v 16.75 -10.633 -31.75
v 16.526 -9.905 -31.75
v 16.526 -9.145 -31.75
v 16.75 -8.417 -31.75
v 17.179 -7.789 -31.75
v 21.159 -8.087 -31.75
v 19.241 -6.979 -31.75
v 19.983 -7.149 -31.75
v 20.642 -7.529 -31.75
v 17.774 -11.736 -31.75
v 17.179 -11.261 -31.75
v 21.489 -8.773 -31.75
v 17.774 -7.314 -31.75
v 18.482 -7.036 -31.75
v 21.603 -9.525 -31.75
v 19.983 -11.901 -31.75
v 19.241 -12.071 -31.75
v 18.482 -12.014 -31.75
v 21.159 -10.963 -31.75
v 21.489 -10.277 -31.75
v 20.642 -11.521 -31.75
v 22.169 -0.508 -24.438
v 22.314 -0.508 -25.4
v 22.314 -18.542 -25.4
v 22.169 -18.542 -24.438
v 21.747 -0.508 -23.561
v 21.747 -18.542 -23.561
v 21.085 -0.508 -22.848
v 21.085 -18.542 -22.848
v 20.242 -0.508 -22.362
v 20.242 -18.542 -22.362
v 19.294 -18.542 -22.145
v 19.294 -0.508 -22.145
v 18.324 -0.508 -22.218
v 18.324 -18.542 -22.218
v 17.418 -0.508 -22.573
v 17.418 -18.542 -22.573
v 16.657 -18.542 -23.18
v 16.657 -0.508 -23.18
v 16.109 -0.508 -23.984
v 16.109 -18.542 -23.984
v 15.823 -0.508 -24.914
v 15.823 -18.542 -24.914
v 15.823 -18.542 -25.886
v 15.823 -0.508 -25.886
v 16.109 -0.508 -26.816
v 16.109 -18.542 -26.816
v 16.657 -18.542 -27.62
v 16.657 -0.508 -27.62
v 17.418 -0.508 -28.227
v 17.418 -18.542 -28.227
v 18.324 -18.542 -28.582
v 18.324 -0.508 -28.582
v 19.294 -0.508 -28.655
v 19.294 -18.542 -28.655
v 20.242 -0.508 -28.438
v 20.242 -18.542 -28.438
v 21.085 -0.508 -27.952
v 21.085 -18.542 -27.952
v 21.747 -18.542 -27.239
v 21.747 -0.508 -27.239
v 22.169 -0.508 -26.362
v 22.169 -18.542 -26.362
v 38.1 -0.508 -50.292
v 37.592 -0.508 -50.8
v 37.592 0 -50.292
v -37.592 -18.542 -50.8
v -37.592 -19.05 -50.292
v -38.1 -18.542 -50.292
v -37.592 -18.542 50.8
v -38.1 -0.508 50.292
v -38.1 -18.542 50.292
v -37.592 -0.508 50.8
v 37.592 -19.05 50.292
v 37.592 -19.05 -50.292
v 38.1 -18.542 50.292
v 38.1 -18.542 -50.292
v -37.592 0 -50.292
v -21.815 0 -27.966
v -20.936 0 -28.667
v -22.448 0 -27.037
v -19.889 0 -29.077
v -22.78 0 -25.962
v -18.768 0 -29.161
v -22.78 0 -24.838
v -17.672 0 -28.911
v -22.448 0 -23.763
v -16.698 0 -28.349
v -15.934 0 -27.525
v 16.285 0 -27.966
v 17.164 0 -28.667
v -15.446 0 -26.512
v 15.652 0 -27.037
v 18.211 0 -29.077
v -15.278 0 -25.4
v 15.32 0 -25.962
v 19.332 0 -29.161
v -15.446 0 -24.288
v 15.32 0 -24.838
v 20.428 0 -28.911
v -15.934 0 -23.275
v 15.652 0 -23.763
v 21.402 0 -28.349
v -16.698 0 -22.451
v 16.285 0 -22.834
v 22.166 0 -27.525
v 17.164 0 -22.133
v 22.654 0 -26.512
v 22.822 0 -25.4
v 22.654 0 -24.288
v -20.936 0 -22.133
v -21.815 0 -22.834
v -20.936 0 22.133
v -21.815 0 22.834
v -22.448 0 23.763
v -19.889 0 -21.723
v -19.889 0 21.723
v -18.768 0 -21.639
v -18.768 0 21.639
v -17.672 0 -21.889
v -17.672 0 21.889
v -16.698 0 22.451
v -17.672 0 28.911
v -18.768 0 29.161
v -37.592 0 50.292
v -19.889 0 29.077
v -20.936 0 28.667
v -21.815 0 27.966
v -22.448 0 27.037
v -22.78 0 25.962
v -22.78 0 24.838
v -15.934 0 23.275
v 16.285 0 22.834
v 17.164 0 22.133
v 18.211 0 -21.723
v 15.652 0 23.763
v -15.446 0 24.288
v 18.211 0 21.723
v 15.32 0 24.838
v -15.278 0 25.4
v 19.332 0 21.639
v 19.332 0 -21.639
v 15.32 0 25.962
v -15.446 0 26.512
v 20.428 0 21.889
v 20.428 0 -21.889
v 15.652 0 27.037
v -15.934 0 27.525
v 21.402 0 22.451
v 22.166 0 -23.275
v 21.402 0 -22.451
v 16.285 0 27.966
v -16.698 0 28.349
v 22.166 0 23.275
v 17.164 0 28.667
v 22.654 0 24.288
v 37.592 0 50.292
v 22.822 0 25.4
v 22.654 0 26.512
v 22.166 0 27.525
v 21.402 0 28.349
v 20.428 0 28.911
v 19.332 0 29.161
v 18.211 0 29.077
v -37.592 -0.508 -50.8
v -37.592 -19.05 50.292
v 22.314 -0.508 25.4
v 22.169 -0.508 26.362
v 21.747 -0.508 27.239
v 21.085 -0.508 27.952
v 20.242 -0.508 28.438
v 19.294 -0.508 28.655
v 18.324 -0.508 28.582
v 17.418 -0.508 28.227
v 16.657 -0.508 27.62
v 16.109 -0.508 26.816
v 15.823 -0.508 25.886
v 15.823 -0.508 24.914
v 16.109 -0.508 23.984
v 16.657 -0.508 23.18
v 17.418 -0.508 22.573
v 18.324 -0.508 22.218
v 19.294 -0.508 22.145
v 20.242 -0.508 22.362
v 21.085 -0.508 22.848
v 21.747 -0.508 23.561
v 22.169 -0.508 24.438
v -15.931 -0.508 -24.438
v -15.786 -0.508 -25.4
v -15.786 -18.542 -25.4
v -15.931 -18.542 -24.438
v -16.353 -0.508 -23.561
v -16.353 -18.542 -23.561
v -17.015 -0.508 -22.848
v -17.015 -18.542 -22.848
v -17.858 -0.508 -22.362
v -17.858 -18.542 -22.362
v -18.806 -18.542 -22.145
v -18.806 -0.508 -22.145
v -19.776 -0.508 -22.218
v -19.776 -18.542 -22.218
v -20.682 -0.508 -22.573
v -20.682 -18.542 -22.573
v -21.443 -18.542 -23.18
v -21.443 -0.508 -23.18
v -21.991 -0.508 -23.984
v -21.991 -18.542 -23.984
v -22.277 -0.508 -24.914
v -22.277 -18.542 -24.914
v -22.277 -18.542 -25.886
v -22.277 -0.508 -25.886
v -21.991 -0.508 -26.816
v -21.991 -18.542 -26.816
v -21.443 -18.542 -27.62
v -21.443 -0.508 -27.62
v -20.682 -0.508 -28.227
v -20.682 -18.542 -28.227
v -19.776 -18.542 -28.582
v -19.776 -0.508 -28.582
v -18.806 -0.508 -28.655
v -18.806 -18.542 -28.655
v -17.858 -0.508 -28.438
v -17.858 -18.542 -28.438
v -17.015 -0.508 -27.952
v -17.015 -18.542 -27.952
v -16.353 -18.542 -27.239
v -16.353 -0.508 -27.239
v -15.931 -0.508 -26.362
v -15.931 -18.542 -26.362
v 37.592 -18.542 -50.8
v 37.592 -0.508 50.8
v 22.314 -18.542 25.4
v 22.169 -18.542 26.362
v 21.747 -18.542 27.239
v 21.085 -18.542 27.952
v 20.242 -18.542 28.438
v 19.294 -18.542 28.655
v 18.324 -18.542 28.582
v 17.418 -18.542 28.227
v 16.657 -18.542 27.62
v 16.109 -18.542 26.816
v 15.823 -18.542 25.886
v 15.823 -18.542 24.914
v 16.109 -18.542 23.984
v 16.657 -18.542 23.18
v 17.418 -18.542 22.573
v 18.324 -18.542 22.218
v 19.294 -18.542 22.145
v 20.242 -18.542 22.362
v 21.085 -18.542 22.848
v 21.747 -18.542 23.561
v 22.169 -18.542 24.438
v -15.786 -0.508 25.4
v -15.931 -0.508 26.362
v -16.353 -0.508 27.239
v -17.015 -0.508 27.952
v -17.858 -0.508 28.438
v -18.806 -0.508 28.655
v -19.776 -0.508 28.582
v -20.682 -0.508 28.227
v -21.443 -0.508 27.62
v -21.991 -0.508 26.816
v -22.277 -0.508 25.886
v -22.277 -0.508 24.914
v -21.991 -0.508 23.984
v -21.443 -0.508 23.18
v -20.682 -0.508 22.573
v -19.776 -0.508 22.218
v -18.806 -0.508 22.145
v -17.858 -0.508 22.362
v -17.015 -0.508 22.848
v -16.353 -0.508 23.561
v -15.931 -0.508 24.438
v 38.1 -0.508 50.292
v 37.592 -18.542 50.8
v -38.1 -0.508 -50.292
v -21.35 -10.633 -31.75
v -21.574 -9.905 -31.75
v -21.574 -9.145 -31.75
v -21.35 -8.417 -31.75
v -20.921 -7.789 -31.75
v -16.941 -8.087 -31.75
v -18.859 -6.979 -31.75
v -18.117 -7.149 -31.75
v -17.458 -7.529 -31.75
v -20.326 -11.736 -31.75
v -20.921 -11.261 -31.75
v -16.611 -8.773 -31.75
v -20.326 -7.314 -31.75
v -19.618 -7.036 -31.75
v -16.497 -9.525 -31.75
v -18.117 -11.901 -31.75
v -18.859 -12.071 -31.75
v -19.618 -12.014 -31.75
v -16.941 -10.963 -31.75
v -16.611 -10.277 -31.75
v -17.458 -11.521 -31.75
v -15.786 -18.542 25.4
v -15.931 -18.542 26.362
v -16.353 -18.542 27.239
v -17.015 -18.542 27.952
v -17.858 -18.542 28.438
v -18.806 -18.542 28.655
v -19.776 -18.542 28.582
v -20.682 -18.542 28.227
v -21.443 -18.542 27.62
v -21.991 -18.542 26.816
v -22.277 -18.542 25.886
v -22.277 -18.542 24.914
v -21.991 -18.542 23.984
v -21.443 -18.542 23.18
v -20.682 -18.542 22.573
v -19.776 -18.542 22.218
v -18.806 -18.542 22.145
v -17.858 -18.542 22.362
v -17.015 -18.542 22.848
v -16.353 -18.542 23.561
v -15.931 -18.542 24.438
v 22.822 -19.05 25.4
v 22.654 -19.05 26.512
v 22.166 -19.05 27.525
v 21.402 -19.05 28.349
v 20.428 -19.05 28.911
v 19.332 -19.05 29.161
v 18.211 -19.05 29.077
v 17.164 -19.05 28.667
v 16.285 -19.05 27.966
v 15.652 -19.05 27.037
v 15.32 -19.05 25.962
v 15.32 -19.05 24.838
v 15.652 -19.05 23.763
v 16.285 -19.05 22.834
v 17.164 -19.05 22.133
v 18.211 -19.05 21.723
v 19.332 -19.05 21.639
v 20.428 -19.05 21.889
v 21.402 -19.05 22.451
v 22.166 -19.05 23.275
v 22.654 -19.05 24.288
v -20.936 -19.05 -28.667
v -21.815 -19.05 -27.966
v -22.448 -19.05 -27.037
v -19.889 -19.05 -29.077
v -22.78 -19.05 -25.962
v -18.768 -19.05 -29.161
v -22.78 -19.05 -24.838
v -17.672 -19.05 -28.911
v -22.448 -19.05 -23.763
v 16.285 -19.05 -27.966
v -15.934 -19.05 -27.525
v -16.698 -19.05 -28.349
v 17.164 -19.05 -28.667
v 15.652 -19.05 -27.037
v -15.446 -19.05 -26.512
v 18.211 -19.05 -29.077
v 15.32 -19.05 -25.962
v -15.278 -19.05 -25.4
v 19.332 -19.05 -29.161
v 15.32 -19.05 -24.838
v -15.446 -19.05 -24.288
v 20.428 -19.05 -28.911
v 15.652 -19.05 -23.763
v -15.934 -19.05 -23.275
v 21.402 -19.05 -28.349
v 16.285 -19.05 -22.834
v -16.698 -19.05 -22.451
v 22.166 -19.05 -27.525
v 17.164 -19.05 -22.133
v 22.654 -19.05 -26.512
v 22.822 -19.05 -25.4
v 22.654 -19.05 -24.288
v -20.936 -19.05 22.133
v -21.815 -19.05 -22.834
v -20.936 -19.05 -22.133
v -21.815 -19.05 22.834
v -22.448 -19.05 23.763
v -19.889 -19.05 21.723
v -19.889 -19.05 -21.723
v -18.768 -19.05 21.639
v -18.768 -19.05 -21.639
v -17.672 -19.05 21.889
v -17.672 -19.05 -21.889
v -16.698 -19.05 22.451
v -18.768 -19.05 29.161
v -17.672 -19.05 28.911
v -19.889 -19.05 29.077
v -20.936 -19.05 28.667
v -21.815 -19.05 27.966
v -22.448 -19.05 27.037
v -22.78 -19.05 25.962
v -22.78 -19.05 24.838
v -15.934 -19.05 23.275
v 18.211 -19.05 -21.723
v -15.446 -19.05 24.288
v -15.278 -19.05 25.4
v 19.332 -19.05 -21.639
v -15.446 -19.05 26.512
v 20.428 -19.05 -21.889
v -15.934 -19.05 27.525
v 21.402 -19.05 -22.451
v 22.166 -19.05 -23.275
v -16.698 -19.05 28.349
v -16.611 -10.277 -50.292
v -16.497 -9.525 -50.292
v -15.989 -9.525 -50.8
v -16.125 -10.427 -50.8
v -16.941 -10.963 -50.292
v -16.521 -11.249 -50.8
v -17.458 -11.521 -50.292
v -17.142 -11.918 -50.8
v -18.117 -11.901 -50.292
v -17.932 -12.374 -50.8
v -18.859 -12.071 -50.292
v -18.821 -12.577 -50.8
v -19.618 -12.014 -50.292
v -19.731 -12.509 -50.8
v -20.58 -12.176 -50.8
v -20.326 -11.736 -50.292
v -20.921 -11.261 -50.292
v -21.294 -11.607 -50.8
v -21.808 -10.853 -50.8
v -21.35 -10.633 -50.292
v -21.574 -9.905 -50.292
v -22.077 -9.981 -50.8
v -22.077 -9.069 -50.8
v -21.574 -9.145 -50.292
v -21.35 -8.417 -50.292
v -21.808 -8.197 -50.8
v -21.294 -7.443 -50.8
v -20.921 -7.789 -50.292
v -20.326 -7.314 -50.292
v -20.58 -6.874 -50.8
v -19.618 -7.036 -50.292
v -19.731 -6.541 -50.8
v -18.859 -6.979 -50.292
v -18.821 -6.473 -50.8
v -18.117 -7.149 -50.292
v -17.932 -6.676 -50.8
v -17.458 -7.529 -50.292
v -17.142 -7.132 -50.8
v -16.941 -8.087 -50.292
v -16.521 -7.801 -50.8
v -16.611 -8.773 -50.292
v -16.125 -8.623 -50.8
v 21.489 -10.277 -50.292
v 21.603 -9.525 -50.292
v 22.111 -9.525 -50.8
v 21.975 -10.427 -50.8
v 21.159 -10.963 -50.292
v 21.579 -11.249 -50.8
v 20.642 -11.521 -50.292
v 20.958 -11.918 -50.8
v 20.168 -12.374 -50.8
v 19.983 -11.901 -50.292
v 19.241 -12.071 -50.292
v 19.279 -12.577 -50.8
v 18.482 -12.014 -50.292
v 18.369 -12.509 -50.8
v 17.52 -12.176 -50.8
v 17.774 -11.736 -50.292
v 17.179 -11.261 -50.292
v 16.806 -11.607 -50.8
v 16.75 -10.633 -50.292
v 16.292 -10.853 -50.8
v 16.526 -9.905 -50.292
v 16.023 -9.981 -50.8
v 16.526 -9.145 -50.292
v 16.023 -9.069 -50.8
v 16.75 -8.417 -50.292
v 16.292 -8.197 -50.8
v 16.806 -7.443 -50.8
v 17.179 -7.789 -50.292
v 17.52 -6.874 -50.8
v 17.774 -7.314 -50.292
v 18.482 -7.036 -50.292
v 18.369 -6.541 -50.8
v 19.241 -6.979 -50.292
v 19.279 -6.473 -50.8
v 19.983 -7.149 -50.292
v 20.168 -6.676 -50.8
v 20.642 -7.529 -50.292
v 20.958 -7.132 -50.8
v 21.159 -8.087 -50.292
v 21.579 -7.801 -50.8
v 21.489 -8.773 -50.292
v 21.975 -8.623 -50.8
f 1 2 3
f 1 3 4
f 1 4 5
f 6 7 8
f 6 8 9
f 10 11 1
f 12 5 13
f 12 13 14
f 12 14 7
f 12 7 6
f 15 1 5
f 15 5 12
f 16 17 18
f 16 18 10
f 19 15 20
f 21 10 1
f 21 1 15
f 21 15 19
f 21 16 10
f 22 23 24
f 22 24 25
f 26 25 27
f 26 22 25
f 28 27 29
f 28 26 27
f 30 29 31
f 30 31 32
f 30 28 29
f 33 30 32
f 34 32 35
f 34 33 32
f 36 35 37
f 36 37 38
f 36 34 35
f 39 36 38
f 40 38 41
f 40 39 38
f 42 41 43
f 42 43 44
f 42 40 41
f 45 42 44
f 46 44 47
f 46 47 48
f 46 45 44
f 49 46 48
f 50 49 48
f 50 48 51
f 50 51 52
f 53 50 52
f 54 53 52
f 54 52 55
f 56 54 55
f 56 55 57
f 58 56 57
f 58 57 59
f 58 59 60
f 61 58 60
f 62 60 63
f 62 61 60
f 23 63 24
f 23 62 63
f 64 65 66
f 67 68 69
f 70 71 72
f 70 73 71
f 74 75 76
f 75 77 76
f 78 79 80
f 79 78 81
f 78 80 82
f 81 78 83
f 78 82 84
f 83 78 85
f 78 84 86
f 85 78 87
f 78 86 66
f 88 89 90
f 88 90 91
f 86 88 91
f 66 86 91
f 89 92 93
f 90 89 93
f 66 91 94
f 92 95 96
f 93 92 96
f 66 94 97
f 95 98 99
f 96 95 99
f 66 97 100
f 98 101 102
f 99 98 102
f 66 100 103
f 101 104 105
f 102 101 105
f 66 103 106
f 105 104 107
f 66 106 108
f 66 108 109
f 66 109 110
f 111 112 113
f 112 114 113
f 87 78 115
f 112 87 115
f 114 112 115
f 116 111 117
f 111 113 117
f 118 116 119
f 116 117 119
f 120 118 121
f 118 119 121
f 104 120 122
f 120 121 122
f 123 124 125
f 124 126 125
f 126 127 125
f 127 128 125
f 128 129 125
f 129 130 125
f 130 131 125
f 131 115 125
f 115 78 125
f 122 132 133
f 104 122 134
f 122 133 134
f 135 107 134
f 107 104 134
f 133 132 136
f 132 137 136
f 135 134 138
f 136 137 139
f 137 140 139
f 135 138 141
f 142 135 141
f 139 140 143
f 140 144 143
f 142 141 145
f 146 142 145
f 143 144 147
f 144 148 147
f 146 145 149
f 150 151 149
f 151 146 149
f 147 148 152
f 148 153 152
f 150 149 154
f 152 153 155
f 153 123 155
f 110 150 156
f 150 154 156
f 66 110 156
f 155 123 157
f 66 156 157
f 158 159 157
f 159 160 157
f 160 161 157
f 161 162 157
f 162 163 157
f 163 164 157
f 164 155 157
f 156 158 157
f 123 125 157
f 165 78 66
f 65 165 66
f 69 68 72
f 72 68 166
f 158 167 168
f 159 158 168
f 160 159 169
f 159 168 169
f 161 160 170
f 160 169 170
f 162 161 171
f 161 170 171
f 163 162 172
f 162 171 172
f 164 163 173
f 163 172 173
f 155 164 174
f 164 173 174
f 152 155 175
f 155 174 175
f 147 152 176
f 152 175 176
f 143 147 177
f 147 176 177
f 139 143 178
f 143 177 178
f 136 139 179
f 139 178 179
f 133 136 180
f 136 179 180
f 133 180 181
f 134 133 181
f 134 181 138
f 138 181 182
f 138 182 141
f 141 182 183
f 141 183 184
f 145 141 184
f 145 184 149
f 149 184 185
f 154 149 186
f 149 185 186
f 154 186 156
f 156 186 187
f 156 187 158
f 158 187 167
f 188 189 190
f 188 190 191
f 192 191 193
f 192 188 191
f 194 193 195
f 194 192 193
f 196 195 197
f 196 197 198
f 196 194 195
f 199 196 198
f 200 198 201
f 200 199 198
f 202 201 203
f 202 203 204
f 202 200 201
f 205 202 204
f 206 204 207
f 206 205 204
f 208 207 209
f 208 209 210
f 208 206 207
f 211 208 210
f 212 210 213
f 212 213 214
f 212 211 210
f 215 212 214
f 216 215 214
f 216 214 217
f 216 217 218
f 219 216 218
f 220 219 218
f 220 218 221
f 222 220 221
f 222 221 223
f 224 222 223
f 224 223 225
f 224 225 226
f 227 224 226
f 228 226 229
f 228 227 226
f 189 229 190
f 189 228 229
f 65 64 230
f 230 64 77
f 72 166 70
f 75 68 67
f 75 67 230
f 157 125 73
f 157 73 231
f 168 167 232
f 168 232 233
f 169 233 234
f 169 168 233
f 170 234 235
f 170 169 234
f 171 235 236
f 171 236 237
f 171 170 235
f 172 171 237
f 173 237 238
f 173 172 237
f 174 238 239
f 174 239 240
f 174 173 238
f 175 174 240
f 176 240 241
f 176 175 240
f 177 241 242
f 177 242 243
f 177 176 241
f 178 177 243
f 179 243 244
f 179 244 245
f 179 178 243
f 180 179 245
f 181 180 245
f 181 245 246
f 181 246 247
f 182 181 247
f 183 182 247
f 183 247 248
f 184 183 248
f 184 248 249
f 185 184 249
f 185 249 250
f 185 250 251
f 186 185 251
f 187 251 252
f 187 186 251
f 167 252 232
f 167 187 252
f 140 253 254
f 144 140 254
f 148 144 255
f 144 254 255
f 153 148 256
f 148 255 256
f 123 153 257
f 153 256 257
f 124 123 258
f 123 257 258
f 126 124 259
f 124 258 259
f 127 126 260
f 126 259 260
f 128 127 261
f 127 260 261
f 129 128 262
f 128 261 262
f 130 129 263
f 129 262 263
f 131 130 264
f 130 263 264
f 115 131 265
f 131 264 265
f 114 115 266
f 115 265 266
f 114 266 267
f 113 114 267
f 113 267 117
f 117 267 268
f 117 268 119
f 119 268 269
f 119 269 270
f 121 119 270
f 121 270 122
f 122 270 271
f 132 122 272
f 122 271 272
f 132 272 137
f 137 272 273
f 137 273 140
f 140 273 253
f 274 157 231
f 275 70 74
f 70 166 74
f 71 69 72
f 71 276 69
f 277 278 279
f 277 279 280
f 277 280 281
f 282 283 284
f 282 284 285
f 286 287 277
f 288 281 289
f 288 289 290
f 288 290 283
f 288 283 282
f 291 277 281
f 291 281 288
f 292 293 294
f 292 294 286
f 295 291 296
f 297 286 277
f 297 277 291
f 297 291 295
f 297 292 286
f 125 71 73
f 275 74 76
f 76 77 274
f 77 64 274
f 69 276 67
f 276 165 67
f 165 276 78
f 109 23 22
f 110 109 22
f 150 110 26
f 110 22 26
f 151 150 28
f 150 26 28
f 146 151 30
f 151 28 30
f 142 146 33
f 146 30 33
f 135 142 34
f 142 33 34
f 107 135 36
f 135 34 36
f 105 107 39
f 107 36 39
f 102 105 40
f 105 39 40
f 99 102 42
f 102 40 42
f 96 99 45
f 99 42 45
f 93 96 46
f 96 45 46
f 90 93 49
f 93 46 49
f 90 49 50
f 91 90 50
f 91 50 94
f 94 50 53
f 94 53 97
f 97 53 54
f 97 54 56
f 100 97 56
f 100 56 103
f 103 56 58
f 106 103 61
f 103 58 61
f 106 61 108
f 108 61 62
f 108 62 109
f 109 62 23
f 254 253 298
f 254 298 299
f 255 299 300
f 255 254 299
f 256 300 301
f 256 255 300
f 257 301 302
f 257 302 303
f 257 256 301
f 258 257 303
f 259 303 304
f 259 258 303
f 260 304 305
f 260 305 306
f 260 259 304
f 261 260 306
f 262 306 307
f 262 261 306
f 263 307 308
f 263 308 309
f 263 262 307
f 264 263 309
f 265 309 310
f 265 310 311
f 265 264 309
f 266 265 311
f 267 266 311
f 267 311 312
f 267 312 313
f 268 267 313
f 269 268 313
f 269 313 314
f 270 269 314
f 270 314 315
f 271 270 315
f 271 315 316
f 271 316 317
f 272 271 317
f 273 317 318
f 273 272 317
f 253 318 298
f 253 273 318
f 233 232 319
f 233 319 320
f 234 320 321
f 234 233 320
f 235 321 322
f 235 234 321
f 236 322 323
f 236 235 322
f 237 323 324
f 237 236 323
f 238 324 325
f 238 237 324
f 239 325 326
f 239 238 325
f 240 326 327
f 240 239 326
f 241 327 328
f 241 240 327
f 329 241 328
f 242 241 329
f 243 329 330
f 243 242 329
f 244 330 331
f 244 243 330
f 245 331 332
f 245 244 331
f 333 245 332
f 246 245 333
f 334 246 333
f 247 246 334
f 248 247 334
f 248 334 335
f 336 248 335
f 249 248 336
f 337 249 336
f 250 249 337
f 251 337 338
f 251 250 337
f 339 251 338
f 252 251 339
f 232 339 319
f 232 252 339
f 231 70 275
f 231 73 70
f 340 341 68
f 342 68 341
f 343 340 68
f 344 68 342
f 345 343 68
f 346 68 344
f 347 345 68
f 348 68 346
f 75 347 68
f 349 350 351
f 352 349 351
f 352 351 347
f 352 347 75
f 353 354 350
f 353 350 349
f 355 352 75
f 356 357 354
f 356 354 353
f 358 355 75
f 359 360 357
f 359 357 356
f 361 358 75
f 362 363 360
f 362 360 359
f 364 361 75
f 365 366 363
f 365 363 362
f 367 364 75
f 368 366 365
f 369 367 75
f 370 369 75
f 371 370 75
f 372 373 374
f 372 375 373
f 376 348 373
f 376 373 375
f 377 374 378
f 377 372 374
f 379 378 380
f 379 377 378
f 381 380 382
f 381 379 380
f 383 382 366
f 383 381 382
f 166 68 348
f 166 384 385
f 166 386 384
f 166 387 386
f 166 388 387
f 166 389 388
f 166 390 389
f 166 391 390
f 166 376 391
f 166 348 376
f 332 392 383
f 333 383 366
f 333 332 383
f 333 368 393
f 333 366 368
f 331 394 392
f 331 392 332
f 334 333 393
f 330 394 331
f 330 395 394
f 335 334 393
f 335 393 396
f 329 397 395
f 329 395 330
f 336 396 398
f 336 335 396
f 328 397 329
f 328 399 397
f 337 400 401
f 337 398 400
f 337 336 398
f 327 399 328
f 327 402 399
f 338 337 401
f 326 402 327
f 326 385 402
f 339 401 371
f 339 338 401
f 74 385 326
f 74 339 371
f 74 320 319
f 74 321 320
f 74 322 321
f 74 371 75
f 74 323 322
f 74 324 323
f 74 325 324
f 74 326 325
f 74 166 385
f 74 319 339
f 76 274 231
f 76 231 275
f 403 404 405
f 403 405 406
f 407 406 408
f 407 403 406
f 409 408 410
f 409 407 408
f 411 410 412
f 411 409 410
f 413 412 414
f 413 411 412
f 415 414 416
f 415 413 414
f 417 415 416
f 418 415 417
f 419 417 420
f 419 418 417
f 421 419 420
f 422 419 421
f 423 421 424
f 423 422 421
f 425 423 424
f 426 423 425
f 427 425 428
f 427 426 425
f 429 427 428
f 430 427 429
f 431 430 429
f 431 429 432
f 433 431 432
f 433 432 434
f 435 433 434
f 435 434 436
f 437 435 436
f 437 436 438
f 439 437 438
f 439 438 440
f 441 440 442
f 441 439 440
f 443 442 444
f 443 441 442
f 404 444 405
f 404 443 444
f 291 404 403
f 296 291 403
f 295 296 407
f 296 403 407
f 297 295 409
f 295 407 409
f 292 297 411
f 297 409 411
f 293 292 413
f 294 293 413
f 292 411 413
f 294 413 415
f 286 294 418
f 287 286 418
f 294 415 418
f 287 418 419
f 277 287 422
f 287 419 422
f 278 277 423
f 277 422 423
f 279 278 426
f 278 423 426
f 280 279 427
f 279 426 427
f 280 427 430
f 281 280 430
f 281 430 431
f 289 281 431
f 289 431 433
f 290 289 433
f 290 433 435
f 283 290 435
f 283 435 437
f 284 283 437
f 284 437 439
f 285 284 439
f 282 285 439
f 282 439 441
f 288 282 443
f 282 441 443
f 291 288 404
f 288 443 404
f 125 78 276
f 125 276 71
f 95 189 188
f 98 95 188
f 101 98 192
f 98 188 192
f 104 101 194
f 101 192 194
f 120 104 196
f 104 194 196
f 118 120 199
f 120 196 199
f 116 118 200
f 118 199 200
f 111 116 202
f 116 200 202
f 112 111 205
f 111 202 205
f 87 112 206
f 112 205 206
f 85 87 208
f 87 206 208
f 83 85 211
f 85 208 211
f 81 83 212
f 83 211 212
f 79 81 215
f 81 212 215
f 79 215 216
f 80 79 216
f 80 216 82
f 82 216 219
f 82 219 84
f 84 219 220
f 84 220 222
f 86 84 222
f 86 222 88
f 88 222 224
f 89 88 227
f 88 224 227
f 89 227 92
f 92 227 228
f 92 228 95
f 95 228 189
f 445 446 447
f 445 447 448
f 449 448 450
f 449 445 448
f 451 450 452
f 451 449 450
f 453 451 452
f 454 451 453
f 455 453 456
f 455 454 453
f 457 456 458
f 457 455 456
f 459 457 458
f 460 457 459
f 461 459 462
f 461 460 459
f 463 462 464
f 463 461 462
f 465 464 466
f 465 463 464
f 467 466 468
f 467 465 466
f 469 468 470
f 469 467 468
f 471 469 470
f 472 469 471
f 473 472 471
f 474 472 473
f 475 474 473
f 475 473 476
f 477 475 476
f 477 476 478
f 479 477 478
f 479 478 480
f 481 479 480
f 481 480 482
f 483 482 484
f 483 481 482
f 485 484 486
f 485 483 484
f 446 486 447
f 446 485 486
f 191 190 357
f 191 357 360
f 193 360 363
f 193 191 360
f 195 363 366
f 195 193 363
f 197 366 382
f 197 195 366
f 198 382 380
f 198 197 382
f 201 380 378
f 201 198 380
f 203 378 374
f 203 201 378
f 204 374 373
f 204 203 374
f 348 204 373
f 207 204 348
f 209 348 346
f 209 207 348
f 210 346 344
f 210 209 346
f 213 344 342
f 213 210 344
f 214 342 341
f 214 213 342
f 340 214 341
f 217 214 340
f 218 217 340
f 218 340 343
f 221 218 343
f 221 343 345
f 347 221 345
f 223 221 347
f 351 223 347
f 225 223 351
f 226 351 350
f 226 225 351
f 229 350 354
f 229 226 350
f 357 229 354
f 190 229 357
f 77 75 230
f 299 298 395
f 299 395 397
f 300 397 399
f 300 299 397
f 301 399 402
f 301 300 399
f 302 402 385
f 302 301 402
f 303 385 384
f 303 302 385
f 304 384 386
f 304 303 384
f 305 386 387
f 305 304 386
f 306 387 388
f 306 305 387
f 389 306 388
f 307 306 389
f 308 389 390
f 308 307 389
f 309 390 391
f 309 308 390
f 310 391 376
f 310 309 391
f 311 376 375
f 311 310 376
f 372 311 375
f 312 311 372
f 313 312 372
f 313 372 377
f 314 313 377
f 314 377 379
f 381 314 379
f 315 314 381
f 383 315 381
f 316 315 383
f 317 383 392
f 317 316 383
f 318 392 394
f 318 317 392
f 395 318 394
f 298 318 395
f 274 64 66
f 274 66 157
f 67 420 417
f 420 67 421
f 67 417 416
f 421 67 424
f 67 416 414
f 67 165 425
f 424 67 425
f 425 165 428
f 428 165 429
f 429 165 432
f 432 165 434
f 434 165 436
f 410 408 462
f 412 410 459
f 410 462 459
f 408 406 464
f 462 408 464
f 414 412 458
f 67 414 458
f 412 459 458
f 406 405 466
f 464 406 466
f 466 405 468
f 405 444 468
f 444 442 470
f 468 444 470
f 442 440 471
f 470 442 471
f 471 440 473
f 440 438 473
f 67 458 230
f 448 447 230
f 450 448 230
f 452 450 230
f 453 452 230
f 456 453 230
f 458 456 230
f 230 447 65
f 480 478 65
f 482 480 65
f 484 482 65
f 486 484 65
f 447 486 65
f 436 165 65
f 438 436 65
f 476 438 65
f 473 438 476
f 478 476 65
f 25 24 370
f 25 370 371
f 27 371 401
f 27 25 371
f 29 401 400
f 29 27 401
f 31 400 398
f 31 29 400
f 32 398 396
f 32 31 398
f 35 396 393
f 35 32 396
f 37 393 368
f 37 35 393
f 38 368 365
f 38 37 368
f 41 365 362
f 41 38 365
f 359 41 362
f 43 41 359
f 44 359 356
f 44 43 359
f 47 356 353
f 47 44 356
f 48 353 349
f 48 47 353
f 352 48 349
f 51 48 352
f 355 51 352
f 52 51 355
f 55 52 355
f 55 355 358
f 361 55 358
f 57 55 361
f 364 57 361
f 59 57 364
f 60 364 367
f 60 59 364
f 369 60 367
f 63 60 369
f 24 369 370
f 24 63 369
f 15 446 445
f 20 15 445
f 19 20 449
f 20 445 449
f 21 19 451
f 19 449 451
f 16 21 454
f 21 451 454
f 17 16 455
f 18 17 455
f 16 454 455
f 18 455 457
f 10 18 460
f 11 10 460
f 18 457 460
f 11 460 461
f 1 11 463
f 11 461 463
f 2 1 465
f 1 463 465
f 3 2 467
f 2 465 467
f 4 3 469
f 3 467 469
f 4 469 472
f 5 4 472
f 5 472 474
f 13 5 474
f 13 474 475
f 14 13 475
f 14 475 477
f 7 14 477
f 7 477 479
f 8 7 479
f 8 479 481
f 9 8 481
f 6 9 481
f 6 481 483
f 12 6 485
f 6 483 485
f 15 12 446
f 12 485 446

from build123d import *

# Parameters (mm, degrees)
F0_W     = 76.2
F0_H     = 101.6
F0_R     = 3.2639
F1_DEPTH = 19.05
F2_R     = 2.5527
F3_DEPTH = 19.05
F4_SIZE  = 0.508


with BuildPart() as f1:
    # F0 (on Front) → F1 (new body)
    with BuildSketch(Plane.XZ):
        Rectangle(F0_W, F0_H)
        with Locations((-19.05, -25.4)):
            Circle(F0_R, mode=Mode.SUBTRACT)
        with Locations((19.05, -25.4)):
            Circle(F0_R, mode=Mode.SUBTRACT)
        with Locations((-19.05, 25.4)):
            Circle(F0_R, mode=Mode.SUBTRACT)
        with Locations((19.05, 25.4)):
            Circle(F0_R, mode=Mode.SUBTRACT)
    extrude(amount=F1_DEPTH)

    # F2 (on face) → F3 (cut)
    with BuildSketch(Plane(origin=(0, 0, -50.8), x_dir=(1, 0, 0), z_dir=(0, 0, -1))):
        with Locations((-19.05, 9.525)):
            Circle(F2_R)
        with Locations((19.05, 9.525)):
            Circle(F2_R)
    extrude(amount=-F3_DEPTH, mode=Mode.SUBTRACT)

    # F4
    f4_edges = [f1.edges().sort_by_distance(p)[0] for p in [
        (38.1, -19.05, 0),
        (0, -19.05, 50.8),
        (-38.1, -19.05, 0),
        (0, -19.05, -50.8),
        (-22.3139, -19.05, -25.4),
        (15.7861, -19.05, -25.4),
        (-22.3139, -19.05, 25.4),
        (15.7861, -19.05, 25.4),
        (-38.1, -9.525, 50.8),
        (-38.1, -9.525, -50.8),
        (-38.1, 0, 0),
        (0, 0, -50.8),
        (38.1, -9.525, -50.8),
        (-21.6027, -9.525, -50.8),
        (16.4973, -9.525, -50.8),
        (38.1, 0, 0),
        (0, 0, 50.8),
        (-22.3139, 0, -25.4),
        (15.7861, 0, -25.4),
        (-22.3139, 0, 25.4),
        (15.7861, 0, 25.4),
        (38.1, -9.525, 50.8),
    ]]
    chamfer(f4_edges, length=F4_SIZE)


solid = f1.part
